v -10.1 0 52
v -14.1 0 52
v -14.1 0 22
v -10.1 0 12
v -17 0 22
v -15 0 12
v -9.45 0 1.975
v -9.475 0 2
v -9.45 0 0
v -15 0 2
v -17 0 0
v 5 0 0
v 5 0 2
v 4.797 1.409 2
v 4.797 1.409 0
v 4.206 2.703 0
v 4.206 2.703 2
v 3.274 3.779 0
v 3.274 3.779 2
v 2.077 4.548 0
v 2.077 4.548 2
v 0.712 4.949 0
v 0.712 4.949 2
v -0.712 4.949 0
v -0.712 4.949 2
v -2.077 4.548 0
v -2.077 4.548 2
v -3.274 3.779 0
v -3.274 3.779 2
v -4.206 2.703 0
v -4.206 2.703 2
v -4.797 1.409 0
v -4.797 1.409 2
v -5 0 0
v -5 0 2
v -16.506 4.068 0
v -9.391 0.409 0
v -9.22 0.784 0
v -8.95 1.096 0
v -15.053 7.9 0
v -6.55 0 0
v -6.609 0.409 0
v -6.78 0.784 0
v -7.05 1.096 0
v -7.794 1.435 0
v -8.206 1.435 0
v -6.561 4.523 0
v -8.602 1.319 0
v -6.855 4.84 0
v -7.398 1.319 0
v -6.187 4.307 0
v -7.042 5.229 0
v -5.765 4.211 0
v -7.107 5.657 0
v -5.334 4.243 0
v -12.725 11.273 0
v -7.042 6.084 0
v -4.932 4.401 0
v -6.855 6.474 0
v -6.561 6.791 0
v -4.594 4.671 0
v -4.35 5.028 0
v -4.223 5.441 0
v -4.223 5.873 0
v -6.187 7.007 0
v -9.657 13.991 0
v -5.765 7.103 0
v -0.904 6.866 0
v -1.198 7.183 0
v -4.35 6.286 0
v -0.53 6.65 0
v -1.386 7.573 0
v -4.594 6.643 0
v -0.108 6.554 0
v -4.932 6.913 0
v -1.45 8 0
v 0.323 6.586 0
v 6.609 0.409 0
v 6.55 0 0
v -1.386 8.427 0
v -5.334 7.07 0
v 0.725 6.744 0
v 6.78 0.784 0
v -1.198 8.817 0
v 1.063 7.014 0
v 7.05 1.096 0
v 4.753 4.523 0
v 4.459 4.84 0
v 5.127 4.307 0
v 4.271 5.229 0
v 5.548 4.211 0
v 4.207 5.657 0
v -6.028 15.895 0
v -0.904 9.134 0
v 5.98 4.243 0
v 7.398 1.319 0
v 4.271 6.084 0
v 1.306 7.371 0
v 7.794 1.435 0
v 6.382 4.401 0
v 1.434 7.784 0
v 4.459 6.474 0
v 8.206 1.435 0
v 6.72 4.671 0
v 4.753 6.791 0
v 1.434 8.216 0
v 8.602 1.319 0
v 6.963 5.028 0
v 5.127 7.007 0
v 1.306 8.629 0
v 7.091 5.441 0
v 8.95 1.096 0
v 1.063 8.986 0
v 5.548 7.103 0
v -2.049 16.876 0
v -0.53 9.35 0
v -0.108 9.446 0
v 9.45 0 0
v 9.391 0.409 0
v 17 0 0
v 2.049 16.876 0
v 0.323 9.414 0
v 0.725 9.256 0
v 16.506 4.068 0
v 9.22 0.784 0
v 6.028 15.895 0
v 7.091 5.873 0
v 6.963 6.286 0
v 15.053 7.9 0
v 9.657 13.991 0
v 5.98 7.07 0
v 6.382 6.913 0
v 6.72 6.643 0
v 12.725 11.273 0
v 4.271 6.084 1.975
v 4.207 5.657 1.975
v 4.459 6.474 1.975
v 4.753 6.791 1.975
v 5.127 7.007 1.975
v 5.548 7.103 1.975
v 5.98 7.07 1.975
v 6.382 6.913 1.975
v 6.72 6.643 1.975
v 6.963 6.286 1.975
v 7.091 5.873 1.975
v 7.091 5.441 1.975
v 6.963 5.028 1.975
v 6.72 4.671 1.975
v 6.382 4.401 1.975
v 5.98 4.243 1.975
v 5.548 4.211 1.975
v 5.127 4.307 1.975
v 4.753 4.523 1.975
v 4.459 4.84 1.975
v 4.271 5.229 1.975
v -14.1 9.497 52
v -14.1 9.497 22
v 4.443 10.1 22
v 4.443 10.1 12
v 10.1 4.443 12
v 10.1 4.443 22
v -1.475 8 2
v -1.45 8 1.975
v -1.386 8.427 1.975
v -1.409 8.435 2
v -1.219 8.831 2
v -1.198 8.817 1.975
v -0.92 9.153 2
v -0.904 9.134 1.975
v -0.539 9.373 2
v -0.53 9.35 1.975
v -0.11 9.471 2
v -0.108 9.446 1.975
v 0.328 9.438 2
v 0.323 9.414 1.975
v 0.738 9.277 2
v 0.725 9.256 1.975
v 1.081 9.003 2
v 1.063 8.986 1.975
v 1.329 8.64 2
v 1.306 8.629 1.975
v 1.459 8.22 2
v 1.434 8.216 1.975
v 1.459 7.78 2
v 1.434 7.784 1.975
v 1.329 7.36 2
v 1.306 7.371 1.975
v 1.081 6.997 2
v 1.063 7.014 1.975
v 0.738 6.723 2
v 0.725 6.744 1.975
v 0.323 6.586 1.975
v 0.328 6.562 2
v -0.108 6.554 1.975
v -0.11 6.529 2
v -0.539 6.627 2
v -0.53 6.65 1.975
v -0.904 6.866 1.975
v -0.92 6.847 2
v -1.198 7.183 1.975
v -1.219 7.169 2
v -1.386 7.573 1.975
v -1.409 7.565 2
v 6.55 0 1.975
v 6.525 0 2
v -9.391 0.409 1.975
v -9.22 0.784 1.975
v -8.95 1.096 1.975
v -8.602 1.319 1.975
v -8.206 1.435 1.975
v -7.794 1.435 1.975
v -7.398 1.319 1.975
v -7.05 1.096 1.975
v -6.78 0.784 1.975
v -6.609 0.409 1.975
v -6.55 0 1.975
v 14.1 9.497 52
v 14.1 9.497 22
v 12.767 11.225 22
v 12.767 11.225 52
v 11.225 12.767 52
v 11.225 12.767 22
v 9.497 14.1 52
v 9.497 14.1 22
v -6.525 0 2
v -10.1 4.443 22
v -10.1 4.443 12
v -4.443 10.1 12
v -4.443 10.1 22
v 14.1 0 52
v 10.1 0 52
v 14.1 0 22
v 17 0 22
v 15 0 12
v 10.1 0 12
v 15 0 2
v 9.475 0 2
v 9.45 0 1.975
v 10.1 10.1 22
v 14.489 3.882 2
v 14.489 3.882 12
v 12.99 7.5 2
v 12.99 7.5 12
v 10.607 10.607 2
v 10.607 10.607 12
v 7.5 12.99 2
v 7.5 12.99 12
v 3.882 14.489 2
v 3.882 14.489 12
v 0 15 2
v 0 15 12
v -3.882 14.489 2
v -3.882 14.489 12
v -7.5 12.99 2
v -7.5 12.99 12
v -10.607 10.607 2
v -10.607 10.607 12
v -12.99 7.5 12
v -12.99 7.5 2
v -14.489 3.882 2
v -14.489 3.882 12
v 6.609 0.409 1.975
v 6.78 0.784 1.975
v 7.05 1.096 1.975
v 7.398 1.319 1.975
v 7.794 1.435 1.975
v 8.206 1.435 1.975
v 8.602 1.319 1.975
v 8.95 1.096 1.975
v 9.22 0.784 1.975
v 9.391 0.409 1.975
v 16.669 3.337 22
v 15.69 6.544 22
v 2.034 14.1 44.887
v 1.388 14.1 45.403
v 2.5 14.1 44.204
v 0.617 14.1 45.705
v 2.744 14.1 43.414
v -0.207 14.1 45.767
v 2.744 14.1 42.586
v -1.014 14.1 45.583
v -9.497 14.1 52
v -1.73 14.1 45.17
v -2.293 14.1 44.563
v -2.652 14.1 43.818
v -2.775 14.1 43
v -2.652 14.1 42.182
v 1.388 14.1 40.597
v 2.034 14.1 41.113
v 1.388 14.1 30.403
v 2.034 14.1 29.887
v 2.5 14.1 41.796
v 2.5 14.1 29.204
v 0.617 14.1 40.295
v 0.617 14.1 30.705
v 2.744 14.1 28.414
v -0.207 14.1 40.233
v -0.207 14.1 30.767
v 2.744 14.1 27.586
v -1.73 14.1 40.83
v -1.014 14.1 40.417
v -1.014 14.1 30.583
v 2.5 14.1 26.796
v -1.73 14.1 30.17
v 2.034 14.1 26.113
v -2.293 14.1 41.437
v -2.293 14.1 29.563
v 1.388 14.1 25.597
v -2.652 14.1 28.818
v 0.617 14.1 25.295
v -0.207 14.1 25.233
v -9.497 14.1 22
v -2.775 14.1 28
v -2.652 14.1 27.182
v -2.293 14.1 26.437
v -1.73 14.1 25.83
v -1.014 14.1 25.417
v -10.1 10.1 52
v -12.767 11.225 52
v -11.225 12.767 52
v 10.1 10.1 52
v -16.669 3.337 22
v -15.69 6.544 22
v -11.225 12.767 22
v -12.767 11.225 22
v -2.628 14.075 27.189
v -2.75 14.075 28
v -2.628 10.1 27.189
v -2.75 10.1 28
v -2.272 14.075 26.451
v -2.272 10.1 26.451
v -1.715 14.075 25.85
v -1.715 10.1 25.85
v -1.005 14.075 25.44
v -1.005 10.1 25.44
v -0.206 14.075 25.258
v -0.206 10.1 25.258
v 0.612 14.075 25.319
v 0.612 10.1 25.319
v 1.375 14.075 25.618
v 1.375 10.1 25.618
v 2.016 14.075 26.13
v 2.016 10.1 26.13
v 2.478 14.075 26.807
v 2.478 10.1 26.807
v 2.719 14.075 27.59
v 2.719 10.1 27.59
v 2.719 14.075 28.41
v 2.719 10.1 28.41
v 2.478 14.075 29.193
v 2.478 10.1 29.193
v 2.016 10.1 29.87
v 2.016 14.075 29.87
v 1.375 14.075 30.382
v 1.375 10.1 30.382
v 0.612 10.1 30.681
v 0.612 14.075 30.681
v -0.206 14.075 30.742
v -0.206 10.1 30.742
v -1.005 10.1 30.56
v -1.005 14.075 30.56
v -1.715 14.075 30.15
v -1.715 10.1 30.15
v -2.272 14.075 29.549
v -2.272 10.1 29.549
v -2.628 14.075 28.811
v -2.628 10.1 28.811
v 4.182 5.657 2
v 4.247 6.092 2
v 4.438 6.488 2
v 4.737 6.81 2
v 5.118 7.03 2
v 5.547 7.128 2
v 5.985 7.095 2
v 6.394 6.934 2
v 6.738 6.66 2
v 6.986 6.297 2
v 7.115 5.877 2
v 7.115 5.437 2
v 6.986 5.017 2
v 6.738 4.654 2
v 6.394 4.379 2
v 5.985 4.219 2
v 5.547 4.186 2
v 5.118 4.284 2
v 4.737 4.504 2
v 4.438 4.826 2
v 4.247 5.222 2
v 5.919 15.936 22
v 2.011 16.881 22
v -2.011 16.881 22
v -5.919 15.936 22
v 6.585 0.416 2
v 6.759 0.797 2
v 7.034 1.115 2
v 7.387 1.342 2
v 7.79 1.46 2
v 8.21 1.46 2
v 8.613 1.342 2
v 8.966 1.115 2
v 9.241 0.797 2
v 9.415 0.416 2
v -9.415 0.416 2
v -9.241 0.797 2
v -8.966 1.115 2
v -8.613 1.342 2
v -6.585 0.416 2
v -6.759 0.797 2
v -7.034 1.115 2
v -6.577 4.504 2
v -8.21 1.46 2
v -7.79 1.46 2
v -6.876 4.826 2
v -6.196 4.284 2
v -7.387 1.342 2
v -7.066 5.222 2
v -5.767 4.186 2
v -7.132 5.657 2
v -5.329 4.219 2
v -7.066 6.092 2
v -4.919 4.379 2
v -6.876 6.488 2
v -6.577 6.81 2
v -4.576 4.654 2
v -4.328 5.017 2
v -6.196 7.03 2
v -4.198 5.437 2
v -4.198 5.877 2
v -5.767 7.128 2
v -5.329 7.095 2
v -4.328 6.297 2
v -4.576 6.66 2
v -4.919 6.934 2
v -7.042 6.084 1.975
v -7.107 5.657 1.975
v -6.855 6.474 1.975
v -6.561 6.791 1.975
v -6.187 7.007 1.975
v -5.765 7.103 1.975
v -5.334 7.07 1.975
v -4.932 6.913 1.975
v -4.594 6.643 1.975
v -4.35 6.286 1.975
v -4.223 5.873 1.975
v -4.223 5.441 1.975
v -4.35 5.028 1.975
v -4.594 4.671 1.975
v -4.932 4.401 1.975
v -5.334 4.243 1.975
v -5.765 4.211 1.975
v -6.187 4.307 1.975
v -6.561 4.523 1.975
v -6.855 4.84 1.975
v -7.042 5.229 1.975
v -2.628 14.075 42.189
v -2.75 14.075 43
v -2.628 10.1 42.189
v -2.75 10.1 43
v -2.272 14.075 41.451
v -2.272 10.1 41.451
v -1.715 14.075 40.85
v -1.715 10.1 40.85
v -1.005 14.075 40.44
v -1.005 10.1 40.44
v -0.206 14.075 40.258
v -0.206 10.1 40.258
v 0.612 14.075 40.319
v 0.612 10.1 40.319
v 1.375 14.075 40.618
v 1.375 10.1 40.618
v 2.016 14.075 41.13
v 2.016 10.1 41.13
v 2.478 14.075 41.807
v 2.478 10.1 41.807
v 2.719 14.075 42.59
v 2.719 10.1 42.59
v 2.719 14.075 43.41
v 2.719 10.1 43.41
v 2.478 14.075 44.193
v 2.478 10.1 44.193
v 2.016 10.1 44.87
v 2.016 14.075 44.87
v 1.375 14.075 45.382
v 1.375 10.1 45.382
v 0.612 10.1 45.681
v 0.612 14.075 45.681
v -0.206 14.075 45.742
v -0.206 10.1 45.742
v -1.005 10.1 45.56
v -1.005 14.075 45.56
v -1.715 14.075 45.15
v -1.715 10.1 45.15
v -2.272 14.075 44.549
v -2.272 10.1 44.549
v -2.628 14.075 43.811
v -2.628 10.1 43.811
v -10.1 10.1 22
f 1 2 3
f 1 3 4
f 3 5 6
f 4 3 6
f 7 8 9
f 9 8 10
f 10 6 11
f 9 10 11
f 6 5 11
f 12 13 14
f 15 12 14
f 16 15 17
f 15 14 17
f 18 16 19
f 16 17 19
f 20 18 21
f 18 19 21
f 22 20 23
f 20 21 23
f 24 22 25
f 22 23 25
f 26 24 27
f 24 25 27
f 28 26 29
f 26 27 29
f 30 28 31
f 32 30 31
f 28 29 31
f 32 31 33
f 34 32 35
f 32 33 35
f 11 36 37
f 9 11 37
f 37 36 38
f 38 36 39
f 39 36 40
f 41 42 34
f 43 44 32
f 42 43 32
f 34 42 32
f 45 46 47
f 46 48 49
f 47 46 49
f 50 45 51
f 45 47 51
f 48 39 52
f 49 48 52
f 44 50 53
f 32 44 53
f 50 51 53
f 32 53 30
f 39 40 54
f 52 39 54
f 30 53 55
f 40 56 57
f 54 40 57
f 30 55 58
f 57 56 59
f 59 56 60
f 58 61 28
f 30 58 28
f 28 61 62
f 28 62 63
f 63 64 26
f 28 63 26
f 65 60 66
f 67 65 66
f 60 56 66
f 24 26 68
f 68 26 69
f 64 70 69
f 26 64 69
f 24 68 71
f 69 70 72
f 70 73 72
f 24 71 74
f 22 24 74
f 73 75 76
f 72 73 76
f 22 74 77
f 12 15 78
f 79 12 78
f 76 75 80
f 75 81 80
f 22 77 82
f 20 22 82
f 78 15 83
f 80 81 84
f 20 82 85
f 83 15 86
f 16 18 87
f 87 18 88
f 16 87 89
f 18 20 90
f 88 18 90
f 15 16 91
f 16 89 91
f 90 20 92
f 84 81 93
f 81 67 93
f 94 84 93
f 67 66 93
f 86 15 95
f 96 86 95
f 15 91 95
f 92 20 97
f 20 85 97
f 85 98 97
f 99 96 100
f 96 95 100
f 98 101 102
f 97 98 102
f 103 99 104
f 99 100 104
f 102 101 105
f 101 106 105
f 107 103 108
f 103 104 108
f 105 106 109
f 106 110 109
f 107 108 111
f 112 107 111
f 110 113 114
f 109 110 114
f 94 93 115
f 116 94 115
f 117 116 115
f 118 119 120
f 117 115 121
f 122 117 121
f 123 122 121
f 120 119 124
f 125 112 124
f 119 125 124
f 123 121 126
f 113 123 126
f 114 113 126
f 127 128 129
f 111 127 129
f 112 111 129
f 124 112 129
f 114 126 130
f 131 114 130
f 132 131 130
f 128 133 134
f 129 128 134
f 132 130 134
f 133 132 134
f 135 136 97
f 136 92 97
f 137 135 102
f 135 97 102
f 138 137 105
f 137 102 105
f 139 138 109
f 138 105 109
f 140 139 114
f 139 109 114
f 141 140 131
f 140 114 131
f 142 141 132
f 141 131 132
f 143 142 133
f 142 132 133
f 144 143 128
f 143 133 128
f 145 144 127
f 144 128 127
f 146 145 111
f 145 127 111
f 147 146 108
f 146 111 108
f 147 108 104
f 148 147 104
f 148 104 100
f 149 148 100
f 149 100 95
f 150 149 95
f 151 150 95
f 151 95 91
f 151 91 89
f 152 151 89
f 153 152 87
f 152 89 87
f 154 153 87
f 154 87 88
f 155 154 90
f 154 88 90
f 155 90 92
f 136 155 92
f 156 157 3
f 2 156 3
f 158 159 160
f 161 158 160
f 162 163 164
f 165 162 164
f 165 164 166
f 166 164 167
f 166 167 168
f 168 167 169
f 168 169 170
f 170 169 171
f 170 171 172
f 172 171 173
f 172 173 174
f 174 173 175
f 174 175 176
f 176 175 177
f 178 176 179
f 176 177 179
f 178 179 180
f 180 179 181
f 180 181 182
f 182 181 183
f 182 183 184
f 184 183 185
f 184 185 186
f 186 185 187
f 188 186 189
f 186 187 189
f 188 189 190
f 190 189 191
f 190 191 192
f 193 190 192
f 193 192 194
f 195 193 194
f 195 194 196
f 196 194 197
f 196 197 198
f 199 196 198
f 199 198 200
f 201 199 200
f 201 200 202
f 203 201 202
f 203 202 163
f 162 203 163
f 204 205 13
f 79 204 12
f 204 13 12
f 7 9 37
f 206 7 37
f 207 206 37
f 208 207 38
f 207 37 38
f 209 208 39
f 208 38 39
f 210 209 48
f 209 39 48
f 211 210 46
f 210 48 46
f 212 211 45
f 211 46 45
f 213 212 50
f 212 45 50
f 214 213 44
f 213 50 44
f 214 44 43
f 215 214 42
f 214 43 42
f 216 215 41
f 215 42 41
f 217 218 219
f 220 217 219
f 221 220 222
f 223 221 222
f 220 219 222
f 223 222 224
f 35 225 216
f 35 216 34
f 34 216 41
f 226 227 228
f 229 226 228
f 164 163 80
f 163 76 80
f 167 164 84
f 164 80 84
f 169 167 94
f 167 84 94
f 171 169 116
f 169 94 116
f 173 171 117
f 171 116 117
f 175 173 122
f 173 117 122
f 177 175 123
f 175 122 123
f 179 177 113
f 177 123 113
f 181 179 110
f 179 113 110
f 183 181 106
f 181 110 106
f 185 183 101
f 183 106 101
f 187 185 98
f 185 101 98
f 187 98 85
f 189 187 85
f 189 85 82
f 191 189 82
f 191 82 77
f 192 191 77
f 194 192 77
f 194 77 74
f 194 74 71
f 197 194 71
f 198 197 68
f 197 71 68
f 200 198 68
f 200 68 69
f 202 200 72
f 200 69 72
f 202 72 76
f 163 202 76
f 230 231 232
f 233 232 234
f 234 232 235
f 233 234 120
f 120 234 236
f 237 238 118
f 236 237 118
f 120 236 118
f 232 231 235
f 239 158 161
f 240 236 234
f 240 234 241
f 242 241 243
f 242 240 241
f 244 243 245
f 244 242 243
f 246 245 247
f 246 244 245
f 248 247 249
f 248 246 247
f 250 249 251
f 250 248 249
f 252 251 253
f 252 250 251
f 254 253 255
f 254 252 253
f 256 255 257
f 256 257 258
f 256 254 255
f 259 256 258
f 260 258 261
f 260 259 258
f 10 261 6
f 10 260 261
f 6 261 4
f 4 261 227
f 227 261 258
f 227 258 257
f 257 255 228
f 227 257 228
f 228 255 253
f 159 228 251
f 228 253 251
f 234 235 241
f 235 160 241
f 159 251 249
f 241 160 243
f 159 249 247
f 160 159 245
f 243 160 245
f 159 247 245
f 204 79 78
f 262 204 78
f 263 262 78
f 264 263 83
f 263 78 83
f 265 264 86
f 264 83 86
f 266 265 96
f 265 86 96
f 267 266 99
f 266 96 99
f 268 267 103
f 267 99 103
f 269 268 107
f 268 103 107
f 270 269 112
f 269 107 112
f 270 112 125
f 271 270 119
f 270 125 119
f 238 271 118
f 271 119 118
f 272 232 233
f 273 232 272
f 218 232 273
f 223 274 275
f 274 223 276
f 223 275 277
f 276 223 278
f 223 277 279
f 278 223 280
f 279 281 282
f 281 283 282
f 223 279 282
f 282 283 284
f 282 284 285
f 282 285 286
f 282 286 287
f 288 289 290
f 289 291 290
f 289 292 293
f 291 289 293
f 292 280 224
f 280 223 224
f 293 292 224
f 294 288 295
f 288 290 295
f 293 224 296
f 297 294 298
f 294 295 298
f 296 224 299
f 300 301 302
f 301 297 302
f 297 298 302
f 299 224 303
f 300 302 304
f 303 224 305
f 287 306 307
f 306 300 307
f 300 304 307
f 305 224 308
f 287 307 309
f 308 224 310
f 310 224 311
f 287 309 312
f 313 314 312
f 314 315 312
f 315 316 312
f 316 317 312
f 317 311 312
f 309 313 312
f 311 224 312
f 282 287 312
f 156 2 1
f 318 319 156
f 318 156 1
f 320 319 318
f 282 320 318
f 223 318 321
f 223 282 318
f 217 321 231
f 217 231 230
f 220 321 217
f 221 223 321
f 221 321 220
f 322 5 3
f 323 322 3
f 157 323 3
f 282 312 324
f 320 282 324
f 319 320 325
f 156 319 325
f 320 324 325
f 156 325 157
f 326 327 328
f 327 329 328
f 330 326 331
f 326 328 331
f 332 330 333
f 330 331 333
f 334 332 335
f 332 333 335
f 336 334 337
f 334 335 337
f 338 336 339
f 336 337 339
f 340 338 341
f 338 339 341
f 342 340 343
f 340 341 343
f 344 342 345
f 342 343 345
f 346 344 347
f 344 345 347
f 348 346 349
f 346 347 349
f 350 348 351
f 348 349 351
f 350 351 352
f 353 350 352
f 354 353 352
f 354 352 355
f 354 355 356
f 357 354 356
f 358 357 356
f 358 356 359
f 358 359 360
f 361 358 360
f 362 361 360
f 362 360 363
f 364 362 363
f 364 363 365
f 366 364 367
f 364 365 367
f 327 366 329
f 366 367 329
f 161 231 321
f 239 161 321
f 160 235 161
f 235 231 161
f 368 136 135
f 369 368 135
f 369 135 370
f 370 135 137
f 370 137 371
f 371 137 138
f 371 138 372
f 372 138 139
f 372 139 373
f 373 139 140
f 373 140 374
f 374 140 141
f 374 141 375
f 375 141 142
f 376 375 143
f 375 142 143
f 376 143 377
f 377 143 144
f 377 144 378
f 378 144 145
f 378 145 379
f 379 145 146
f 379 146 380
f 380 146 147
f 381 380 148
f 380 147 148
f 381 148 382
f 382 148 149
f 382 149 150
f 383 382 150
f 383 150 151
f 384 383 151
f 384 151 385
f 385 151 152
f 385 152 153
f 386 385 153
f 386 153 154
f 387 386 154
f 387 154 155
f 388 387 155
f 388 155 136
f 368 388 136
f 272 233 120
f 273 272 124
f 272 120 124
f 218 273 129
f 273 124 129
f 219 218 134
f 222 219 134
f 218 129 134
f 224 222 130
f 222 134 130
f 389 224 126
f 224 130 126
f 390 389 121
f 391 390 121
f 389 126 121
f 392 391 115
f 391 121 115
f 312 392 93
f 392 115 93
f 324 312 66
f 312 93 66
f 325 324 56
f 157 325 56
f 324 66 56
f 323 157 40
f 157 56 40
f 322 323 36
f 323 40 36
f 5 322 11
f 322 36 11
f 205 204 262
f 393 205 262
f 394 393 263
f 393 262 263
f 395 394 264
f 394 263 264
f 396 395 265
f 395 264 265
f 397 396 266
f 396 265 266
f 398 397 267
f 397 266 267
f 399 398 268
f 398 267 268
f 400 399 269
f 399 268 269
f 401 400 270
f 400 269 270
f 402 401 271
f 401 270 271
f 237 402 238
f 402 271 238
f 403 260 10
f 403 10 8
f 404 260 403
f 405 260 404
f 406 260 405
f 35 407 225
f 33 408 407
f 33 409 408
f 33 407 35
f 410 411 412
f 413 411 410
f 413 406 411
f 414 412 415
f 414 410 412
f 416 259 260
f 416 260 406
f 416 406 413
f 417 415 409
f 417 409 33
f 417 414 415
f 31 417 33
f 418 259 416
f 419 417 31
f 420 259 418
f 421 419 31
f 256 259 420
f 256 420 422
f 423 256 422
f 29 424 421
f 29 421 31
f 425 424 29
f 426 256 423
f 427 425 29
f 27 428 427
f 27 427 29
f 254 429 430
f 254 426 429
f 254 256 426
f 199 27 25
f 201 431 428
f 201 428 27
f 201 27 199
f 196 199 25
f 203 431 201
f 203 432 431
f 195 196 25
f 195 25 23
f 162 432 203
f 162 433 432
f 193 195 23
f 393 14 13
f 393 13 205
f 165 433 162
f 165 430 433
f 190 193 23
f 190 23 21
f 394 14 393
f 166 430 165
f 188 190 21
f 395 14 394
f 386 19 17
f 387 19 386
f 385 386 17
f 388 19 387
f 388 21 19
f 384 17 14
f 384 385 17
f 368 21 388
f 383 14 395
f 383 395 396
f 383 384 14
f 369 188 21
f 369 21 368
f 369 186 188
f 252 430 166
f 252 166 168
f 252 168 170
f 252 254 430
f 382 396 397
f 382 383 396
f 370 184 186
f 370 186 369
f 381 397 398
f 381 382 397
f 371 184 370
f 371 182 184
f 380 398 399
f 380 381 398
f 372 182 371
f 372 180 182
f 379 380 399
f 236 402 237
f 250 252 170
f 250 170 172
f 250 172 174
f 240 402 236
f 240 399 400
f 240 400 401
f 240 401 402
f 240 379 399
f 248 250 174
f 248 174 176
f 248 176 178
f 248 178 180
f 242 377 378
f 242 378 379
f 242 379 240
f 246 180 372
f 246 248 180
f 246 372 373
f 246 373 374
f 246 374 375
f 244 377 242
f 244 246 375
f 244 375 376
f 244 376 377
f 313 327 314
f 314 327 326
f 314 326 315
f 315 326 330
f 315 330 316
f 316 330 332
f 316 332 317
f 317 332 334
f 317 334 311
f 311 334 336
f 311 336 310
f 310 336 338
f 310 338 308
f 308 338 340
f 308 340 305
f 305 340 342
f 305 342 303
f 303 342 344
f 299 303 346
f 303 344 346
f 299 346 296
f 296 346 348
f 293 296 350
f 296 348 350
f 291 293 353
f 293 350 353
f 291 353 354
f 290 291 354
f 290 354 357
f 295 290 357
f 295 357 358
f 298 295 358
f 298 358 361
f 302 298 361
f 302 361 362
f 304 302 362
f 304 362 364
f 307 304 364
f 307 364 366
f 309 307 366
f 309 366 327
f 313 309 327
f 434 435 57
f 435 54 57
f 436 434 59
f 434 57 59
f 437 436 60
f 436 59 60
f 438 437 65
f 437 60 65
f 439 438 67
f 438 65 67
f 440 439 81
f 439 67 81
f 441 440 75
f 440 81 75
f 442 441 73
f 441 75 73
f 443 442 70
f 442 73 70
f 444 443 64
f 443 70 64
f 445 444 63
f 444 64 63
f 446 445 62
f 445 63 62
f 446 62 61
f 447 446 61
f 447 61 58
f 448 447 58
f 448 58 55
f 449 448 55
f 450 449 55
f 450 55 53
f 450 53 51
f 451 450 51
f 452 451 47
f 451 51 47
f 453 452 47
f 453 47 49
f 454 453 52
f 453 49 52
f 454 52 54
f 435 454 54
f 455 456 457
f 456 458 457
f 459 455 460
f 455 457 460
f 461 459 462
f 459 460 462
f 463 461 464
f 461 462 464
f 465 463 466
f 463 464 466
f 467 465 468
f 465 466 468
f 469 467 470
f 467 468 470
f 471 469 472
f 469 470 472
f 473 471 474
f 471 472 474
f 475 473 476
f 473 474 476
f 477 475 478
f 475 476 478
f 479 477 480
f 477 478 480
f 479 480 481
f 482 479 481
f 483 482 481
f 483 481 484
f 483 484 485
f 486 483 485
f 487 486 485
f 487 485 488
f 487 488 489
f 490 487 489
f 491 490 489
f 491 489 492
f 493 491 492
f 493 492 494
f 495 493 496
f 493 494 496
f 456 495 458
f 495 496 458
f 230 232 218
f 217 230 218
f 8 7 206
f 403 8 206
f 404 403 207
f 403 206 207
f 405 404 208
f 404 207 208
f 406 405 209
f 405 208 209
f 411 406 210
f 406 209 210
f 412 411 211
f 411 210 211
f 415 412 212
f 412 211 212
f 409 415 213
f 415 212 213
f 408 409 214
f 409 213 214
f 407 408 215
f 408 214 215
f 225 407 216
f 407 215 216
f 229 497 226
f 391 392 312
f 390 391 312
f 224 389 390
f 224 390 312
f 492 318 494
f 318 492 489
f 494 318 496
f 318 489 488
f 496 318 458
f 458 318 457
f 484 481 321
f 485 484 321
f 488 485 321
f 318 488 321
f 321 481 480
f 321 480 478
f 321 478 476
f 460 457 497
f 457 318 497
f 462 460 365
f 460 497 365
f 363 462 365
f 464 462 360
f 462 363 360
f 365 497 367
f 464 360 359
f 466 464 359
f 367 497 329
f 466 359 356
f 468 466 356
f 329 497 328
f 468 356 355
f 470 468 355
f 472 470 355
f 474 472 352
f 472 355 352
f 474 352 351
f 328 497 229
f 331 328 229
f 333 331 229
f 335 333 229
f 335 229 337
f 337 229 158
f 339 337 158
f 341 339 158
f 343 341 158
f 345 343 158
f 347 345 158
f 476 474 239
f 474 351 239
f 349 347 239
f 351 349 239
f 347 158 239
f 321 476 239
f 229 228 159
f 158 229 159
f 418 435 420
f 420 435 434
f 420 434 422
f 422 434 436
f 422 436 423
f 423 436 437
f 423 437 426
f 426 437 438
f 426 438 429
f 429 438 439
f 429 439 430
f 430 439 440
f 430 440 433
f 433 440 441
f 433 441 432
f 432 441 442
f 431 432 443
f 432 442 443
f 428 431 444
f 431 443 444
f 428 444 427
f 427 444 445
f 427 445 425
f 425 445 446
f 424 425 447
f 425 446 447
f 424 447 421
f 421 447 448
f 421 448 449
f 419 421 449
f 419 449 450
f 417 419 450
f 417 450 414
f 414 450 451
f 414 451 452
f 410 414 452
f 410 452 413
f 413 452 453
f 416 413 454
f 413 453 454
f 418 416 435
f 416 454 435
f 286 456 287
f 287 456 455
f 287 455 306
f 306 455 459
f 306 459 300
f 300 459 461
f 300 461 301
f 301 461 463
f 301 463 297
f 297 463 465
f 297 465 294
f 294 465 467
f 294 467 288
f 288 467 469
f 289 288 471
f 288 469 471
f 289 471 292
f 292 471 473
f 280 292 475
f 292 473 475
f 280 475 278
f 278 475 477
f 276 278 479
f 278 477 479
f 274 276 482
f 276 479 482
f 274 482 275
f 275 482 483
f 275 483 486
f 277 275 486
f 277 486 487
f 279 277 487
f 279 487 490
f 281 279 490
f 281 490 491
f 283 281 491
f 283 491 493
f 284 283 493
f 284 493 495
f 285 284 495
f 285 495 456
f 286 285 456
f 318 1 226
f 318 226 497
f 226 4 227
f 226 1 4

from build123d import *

# Parameters (mm, degrees)
SKETCH_1_R                     = 17
EXTRUDE_1_DEPTH                = 2
SKETCH_2_R                     = 17
SKETCH_2_R_2                   = 15
EXTRUDE_2_DEPTH                = 10
SKETCH_3_R                     = 5
CUT_EXTRUDE_1_DEPTH            = 27.038433133
SKETCH_4_R                     = 17
EXTRUDE_3_DEPTH                = 10
SKETCH_5_W                     = 20.2
SKETCH_5_H                     = 20.2
EXTRUDE_4_DEPTH                = 30
HOLE_WIZARD_M5_2_D             = 5.5
HOLE_WIZARD_M5_2_CSINK_D       = 5.55
HOLE_WIZARD_M5_2_CSINK_ANGLE   = 90
HOLE_WIZARD_M2_5_2_D           = 2.9
HOLE_WIZARD_M2_5_2_CSINK_D     = 2.95
HOLE_WIZARD_M2_5_2_CSINK_ANGLE = 90
SKETCH1_W                      = 65
SKETCH1_H                      = 40
CUT_EXTRUDE2_DEPTH             = 58.28874235


with BuildPart() as part:
    # 草图1 → 凸台-拉伸1 (new body)
    with BuildSketch(Plane.XY):
        Circle(SKETCH_1_R)
    extrude(amount=EXTRUDE_1_DEPTH)

    # 草图2 → 凸台-拉伸2 (add)
    with BuildSketch(Plane.XY.offset(2)):
        Circle(SKETCH_2_R)
        Circle(SKETCH_2_R_2, mode=Mode.SUBTRACT)
    extrude(amount=EXTRUDE_2_DEPTH)

    # 草图3 → 切除-拉伸1 (cut, through all)
    with BuildSketch(Plane.XY.offset(2)):
        Circle(SKETCH_3_R)
    extrude(amount=-CUT_EXTRUDE_1_DEPTH, mode=Mode.SUBTRACT)

    # 草图4 → 凸台-拉伸3 (add)
    with BuildSketch(Plane.XY.offset(12)):
        Circle(SKETCH_4_R)
        Polygon((-4.443145751, 10.1), (4.443145751, 10.1), (10.1, 4.443145751), (10.1, -4.443145751), (4.443145751, -10.1), (-4.443145751, -10.1), (-10.1, -4.443145751), (-10.1, 4.443145751), align=None, mode=Mode.SUBTRACT)
    extrude(amount=EXTRUDE_3_DEPTH)

    # 草图5 → 凸台-拉伸4 (add)
    with BuildSketch(Plane.XY.offset(22)):
        with BuildLine():
            Line((9.49684158, 14.1), (-9.49684158, 14.1))
            ThreePointArc((-9.49684158, 14.1), (-12.02081528, 12.02081528), (-14.1, 9.49684158))
            Line((-14.1, 9.49684158), (-14.1, -9.496842588))
            ThreePointArc((-14.1, -9.496842588), (-12.020815678, -12.020815678), (-9.496842588, -14.1))
            Line((-9.496842588, -14.1), (9.49684158, -14.1))
            ThreePointArc((9.49684158, -14.1), (12.02081528, -12.02081528), (14.1, -9.49684158))
            Line((14.1, -9.49684158), (14.1, 9.49684158))
            ThreePointArc((14.1, 9.49684158), (12.02081528, 12.02081528), (9.49684158, 14.1))
        make_face()
        Rectangle(SKETCH_5_W, SKETCH_5_H, mode=Mode.SUBTRACT)
    extrude(amount=EXTRUDE_4_DEPTH)

    # M5 间隙孔2 (through all)
    with Locations(Plane(origin=(0, 14.1, 0), x_dir=(1, 0, 0), z_dir=(0, 1, 0))):
        with Locations((0, -28), (0, -43)):
            CounterSinkHole(HOLE_WIZARD_M5_2_D / 2, HOLE_WIZARD_M5_2_CSINK_D / 2, counter_sink_angle=HOLE_WIZARD_M5_2_CSINK_ANGLE)

    # M2.5 间隙孔2 (through all)
    with Locations(Plane.XY.offset(2)):
        with Locations((0, 8), (5.656854249, 5.656854249), (8, 0), (5.656854249, -5.656854249), (0, -8), (-5.656854249, -5.656854249), (-8, 0), (-5.656854249, 5.656854249)):
            CounterSinkHole(HOLE_WIZARD_M2_5_2_D / 2, HOLE_WIZARD_M2_5_2_CSINK_D / 2, counter_sink_angle=HOLE_WIZARD_M2_5_2_CSINK_ANGLE)

    # Sketch1 → Cut-Extrude2 (cut, through all)
    with BuildSketch(Plane(origin=(0, 0, 0), x_dir=(0, 0, -1), z_dir=(0, 1, 0))):
        with Locations((-30, 0)):
            Rectangle(SKETCH1_W, SKETCH1_H)
    extrude(amount=-CUT_EXTRUDE2_DEPTH, mode=Mode.SUBTRACT)


solid = part.part
